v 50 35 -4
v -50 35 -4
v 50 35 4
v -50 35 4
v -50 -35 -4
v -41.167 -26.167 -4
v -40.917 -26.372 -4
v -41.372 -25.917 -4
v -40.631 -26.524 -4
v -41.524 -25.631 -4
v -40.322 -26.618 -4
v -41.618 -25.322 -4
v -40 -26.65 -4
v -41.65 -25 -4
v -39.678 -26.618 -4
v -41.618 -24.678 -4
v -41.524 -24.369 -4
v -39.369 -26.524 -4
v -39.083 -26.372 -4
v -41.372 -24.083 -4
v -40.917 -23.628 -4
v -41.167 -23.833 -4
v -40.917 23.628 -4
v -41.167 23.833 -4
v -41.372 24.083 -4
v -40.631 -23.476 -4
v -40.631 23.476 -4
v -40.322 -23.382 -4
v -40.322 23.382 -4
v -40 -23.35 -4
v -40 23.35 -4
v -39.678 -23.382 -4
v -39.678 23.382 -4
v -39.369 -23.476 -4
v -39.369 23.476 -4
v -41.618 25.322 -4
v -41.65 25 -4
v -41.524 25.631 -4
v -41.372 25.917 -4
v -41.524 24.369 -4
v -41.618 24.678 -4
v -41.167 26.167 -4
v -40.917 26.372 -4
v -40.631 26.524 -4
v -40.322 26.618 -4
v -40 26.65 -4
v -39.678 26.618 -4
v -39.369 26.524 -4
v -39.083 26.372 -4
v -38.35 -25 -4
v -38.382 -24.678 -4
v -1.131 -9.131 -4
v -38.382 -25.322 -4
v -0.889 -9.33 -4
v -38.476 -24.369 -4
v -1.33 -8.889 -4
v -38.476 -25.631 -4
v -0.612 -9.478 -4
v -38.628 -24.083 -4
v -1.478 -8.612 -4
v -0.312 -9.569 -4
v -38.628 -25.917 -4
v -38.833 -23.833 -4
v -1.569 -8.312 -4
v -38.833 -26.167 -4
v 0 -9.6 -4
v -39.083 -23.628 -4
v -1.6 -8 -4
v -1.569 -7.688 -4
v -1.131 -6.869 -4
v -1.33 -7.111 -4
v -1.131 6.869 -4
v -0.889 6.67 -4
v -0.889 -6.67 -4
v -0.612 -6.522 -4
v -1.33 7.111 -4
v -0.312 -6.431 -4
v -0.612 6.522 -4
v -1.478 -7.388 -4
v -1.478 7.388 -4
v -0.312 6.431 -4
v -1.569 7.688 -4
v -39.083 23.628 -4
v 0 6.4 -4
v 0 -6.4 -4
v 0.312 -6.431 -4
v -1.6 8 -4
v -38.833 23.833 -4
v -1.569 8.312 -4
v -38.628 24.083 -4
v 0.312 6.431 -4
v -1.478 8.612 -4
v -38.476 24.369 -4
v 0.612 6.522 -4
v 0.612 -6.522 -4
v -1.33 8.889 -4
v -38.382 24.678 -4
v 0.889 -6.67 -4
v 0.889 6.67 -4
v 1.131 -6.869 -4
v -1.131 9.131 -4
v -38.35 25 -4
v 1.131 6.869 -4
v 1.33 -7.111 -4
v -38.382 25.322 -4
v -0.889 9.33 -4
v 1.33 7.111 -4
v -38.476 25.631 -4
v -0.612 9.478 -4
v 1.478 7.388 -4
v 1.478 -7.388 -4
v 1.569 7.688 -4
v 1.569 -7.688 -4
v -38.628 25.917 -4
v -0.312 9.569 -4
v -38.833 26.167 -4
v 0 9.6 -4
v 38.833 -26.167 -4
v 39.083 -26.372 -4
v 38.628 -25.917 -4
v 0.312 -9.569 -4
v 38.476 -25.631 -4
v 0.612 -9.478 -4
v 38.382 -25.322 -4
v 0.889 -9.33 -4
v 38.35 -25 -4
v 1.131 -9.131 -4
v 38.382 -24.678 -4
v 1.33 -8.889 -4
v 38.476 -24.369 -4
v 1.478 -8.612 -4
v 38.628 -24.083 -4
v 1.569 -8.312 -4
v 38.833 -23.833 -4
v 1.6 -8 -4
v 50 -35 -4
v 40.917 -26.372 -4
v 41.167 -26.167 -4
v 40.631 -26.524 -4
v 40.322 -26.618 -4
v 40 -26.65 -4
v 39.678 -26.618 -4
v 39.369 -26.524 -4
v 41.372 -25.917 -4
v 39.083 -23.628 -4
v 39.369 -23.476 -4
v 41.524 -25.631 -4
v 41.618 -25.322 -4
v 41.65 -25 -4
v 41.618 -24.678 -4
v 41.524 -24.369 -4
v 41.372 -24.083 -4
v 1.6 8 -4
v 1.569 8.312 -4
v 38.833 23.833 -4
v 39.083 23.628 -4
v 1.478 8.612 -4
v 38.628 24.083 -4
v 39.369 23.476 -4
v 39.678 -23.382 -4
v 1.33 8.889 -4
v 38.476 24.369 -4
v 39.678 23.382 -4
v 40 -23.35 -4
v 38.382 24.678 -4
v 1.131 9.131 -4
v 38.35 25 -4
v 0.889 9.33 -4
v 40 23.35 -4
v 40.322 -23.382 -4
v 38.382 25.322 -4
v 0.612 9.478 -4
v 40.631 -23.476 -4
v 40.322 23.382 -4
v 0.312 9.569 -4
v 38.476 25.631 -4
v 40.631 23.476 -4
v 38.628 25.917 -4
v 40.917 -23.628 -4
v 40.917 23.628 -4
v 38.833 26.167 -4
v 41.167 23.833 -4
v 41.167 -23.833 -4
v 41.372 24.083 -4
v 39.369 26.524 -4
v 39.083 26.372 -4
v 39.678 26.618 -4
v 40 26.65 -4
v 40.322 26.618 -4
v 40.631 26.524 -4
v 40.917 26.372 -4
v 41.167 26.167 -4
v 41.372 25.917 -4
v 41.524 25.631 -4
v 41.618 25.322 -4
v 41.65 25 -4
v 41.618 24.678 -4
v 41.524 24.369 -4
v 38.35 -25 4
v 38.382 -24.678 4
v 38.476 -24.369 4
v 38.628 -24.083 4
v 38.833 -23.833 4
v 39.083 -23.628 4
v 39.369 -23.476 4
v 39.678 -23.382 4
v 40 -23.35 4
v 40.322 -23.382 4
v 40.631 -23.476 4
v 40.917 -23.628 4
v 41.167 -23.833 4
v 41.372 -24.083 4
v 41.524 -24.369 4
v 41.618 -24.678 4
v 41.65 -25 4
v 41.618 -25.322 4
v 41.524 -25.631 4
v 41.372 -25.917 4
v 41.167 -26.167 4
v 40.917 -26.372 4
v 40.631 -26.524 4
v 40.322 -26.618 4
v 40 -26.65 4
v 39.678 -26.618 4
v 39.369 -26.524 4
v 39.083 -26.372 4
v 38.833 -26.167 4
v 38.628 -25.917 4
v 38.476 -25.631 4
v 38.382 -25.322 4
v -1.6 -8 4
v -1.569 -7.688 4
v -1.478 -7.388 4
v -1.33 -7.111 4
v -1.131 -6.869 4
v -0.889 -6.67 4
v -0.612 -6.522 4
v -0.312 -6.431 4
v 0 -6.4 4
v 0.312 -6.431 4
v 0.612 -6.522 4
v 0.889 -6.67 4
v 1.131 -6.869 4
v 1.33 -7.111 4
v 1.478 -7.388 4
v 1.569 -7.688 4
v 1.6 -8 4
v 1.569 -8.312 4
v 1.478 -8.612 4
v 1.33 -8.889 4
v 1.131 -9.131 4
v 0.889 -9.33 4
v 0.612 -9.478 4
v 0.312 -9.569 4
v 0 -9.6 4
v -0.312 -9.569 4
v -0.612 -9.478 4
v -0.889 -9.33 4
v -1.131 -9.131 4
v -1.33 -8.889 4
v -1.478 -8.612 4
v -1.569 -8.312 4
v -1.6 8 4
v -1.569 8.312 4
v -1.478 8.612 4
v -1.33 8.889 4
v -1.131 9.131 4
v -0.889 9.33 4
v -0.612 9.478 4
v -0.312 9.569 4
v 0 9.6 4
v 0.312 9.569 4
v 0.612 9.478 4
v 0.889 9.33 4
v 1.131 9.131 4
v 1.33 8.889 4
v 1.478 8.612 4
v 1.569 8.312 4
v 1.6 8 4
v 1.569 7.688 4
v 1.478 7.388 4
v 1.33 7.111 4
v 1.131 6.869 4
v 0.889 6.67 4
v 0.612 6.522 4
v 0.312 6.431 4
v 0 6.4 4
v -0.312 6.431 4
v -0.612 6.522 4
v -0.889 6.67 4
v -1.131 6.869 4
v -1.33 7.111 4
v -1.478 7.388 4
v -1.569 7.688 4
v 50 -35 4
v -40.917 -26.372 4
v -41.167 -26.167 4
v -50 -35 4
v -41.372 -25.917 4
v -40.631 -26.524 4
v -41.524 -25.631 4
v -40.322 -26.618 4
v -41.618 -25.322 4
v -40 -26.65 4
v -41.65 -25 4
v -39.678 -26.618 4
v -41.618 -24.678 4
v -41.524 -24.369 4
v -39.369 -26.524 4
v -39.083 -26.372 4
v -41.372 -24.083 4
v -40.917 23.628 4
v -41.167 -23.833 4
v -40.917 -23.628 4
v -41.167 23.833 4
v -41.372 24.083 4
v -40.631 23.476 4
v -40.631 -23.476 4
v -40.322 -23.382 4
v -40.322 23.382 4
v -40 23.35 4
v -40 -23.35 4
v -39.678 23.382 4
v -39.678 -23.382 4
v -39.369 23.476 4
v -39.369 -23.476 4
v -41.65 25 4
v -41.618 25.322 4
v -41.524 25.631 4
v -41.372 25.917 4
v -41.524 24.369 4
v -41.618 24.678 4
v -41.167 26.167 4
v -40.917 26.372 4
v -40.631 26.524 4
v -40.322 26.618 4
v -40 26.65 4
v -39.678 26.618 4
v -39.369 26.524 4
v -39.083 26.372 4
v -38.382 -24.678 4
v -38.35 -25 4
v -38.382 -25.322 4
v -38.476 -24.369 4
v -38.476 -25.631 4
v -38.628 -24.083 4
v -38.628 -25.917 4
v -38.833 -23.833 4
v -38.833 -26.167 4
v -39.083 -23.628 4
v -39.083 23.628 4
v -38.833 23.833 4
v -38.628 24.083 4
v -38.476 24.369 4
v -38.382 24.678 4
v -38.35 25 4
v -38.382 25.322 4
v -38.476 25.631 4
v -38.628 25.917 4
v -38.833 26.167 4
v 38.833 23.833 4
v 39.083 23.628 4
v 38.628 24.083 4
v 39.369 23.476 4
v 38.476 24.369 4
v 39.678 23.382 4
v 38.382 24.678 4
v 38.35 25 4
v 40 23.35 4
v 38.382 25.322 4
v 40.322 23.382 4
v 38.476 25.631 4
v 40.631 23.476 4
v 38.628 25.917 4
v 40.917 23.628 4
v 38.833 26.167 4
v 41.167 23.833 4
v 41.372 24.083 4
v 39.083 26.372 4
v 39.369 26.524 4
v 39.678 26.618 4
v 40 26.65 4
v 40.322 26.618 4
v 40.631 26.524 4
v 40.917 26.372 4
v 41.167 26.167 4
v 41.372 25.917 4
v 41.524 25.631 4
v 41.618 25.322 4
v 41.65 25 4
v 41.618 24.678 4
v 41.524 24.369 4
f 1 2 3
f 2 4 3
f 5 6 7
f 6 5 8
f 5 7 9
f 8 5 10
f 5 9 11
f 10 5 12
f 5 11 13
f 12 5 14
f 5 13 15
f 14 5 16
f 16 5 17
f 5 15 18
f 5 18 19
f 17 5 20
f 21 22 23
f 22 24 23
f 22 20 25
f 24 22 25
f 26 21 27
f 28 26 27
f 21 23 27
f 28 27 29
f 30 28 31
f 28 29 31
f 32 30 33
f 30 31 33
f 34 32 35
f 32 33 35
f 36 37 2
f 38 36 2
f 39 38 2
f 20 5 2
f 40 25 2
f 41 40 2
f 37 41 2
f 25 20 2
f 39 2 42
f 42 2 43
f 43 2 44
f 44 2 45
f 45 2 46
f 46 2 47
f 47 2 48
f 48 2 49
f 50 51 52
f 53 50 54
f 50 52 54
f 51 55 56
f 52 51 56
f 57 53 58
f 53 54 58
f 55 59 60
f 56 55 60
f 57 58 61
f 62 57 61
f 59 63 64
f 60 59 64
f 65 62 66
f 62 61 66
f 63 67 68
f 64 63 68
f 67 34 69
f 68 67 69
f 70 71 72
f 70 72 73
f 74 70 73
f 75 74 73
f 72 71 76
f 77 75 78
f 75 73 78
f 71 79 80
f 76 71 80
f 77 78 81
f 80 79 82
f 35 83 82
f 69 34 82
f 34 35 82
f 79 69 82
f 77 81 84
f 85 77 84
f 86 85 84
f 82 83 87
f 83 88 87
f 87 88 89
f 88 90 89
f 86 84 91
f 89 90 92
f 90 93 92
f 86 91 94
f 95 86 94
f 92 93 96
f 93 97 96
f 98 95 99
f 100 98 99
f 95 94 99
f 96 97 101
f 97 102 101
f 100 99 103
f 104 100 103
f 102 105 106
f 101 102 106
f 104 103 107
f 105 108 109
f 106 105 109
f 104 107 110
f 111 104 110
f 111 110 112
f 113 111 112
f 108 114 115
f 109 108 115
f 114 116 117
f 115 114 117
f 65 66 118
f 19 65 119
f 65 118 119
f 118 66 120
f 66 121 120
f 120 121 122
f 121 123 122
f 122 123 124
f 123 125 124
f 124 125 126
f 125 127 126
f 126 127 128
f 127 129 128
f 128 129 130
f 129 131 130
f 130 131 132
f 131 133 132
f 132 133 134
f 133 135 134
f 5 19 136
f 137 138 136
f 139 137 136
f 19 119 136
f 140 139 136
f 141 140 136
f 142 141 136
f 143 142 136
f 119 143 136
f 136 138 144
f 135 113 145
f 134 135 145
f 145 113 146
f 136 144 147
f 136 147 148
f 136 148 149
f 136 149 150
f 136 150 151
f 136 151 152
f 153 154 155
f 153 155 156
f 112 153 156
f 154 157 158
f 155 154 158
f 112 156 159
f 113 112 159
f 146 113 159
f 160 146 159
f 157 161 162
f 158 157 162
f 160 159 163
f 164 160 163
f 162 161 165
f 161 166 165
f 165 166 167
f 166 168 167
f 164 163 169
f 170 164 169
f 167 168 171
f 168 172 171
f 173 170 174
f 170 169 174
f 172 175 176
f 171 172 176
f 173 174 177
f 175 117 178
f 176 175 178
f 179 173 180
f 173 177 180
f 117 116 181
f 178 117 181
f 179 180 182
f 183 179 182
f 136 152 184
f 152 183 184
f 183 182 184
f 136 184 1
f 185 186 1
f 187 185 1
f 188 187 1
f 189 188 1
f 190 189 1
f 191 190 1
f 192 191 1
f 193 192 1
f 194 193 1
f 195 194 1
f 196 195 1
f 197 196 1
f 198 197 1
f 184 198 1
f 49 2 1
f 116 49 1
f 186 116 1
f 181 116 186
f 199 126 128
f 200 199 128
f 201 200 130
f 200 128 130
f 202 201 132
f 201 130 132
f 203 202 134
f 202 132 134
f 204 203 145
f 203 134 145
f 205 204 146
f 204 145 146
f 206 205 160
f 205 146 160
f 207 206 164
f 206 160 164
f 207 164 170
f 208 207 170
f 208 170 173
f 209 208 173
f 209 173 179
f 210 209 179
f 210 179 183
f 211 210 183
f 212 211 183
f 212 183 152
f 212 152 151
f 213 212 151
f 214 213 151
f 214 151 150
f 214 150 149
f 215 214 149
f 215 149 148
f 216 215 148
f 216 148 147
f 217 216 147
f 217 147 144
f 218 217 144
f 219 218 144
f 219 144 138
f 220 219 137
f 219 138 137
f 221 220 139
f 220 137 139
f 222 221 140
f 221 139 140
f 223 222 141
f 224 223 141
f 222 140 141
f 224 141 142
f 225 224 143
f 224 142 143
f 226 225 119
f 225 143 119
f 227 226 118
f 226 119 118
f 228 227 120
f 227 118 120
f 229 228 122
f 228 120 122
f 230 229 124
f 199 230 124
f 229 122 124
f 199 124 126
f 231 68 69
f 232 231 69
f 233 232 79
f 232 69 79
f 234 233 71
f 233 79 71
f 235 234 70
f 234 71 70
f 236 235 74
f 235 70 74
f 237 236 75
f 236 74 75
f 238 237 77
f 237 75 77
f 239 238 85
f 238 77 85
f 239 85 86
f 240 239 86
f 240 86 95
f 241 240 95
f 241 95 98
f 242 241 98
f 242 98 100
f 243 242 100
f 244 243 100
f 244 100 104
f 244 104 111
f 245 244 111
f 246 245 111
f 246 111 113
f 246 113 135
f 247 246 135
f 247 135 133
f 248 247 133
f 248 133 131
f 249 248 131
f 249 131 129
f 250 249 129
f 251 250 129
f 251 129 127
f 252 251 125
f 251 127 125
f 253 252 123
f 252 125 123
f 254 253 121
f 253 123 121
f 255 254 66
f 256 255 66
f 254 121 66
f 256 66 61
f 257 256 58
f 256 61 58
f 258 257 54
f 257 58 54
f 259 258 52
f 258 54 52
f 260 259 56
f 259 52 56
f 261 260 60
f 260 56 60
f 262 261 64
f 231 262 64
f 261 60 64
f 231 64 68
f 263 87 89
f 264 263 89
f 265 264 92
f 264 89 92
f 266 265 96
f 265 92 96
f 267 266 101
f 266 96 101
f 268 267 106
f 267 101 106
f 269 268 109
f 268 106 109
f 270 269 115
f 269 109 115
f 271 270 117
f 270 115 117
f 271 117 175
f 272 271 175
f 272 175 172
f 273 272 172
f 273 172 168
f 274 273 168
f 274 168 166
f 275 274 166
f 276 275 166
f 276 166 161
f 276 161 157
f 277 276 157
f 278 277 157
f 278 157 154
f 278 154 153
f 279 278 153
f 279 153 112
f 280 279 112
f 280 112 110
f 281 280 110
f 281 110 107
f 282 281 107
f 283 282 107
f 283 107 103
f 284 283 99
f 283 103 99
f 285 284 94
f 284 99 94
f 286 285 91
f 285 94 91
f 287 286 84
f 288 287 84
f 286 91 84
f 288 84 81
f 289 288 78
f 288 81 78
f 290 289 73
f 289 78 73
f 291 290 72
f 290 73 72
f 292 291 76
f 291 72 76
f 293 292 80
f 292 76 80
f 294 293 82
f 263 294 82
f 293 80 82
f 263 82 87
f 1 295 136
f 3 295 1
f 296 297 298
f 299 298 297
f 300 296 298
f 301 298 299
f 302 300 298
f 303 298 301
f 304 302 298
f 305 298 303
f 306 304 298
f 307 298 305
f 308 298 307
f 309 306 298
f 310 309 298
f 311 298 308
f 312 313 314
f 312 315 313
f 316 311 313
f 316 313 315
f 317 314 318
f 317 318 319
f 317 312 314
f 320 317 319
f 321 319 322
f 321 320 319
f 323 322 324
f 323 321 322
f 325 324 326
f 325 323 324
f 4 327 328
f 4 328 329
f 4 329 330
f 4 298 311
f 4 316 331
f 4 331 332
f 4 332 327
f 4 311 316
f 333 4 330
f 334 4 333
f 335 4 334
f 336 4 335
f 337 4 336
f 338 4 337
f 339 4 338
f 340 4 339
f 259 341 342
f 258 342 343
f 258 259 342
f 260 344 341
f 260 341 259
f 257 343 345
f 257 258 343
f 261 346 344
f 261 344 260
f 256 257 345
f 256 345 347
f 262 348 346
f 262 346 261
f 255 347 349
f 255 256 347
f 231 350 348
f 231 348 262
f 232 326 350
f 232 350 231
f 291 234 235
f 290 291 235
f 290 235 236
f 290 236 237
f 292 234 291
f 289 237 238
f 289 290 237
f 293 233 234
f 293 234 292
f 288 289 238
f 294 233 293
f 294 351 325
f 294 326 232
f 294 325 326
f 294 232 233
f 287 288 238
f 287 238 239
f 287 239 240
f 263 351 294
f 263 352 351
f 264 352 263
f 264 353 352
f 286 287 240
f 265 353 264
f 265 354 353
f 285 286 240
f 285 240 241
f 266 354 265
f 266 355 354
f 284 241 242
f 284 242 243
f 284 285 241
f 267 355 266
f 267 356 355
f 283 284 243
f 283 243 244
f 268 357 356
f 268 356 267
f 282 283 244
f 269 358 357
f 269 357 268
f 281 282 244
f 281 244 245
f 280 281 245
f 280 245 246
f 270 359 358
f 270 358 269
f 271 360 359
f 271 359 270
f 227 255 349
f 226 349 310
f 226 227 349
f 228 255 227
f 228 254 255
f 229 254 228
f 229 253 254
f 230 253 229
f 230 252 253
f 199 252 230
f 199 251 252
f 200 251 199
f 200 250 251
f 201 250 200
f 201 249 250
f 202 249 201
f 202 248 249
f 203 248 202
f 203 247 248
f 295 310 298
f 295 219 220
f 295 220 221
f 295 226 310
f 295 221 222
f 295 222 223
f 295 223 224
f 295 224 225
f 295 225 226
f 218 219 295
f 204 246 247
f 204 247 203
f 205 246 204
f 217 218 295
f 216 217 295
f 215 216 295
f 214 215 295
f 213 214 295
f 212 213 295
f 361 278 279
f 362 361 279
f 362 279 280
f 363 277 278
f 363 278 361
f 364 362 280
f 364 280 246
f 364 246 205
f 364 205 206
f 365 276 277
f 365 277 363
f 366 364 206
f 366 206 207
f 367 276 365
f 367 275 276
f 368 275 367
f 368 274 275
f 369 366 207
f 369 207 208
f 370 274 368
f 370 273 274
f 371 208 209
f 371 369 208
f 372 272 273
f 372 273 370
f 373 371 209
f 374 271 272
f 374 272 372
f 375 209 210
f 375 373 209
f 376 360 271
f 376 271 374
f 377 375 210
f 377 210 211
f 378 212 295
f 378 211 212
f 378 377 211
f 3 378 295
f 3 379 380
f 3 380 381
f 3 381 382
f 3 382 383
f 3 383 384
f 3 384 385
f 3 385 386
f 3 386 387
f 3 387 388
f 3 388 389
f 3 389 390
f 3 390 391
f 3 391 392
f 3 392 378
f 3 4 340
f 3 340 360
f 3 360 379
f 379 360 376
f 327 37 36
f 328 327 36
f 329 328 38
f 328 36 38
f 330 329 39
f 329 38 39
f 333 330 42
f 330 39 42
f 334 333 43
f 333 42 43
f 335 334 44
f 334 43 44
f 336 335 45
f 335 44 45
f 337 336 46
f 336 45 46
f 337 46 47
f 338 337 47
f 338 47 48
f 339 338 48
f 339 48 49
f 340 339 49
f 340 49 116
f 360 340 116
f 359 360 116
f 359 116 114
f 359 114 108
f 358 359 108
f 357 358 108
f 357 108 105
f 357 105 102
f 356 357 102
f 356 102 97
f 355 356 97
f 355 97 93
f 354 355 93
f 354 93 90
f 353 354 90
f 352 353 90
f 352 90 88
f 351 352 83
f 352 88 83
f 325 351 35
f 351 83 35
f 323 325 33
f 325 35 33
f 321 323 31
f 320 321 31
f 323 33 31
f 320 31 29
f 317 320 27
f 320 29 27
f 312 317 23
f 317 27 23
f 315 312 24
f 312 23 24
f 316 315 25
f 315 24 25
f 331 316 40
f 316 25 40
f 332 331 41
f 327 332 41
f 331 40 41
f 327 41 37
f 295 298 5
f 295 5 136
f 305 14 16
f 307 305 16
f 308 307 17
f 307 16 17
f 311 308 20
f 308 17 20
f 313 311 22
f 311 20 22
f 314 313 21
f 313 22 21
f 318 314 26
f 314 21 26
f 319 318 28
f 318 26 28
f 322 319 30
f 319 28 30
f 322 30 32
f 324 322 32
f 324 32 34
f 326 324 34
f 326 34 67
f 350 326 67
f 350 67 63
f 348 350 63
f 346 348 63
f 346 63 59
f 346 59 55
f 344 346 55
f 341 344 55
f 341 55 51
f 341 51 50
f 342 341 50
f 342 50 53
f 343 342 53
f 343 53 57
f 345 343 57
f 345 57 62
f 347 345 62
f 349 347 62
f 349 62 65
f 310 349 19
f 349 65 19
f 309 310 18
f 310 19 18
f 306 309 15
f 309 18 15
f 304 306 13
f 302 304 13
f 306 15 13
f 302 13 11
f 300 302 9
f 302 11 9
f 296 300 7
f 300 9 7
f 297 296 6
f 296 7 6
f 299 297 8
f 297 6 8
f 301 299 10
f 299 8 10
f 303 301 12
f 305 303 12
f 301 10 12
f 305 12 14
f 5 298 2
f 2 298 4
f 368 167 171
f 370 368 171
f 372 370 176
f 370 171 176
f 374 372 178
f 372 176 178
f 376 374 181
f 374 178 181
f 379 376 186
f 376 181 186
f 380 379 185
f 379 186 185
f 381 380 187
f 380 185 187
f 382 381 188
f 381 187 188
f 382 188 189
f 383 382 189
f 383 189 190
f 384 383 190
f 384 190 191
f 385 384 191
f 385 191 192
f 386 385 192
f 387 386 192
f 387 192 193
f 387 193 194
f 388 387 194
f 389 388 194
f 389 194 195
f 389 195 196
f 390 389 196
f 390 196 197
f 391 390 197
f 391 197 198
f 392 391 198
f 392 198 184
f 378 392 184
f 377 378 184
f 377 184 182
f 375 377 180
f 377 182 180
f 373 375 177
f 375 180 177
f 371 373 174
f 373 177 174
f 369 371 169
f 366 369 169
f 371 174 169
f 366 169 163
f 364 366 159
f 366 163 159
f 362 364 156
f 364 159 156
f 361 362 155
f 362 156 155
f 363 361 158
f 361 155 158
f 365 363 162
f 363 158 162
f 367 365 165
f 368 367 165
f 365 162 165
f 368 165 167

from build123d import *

# Parameters (mm, degrees)
F0_W     = 100
F0_H     = 70
F1_DEPTH = 4
F3_D     = 3.3
F4_D     = 3.2


with BuildPart() as f1:
    # F0 (on Top) → F1 (new body, symmetric)
    with BuildSketch(Plane.XY):
        Rectangle(F0_W, F0_H)
    extrude(amount=F1_DEPTH, both=True)

    # F3 (through all)
    with Locations(Plane.XY.offset(4)):
        with Locations((40, 25), (40, -25), (-40, -25), (-40, 25)):
            Hole(F3_D / 2)

    # F4 (through all)
    with Locations(Plane.XY.offset(4)):
        with Locations((0, 8), (0, -8)):
            Hole(F4_D / 2)


solid = f1.part
